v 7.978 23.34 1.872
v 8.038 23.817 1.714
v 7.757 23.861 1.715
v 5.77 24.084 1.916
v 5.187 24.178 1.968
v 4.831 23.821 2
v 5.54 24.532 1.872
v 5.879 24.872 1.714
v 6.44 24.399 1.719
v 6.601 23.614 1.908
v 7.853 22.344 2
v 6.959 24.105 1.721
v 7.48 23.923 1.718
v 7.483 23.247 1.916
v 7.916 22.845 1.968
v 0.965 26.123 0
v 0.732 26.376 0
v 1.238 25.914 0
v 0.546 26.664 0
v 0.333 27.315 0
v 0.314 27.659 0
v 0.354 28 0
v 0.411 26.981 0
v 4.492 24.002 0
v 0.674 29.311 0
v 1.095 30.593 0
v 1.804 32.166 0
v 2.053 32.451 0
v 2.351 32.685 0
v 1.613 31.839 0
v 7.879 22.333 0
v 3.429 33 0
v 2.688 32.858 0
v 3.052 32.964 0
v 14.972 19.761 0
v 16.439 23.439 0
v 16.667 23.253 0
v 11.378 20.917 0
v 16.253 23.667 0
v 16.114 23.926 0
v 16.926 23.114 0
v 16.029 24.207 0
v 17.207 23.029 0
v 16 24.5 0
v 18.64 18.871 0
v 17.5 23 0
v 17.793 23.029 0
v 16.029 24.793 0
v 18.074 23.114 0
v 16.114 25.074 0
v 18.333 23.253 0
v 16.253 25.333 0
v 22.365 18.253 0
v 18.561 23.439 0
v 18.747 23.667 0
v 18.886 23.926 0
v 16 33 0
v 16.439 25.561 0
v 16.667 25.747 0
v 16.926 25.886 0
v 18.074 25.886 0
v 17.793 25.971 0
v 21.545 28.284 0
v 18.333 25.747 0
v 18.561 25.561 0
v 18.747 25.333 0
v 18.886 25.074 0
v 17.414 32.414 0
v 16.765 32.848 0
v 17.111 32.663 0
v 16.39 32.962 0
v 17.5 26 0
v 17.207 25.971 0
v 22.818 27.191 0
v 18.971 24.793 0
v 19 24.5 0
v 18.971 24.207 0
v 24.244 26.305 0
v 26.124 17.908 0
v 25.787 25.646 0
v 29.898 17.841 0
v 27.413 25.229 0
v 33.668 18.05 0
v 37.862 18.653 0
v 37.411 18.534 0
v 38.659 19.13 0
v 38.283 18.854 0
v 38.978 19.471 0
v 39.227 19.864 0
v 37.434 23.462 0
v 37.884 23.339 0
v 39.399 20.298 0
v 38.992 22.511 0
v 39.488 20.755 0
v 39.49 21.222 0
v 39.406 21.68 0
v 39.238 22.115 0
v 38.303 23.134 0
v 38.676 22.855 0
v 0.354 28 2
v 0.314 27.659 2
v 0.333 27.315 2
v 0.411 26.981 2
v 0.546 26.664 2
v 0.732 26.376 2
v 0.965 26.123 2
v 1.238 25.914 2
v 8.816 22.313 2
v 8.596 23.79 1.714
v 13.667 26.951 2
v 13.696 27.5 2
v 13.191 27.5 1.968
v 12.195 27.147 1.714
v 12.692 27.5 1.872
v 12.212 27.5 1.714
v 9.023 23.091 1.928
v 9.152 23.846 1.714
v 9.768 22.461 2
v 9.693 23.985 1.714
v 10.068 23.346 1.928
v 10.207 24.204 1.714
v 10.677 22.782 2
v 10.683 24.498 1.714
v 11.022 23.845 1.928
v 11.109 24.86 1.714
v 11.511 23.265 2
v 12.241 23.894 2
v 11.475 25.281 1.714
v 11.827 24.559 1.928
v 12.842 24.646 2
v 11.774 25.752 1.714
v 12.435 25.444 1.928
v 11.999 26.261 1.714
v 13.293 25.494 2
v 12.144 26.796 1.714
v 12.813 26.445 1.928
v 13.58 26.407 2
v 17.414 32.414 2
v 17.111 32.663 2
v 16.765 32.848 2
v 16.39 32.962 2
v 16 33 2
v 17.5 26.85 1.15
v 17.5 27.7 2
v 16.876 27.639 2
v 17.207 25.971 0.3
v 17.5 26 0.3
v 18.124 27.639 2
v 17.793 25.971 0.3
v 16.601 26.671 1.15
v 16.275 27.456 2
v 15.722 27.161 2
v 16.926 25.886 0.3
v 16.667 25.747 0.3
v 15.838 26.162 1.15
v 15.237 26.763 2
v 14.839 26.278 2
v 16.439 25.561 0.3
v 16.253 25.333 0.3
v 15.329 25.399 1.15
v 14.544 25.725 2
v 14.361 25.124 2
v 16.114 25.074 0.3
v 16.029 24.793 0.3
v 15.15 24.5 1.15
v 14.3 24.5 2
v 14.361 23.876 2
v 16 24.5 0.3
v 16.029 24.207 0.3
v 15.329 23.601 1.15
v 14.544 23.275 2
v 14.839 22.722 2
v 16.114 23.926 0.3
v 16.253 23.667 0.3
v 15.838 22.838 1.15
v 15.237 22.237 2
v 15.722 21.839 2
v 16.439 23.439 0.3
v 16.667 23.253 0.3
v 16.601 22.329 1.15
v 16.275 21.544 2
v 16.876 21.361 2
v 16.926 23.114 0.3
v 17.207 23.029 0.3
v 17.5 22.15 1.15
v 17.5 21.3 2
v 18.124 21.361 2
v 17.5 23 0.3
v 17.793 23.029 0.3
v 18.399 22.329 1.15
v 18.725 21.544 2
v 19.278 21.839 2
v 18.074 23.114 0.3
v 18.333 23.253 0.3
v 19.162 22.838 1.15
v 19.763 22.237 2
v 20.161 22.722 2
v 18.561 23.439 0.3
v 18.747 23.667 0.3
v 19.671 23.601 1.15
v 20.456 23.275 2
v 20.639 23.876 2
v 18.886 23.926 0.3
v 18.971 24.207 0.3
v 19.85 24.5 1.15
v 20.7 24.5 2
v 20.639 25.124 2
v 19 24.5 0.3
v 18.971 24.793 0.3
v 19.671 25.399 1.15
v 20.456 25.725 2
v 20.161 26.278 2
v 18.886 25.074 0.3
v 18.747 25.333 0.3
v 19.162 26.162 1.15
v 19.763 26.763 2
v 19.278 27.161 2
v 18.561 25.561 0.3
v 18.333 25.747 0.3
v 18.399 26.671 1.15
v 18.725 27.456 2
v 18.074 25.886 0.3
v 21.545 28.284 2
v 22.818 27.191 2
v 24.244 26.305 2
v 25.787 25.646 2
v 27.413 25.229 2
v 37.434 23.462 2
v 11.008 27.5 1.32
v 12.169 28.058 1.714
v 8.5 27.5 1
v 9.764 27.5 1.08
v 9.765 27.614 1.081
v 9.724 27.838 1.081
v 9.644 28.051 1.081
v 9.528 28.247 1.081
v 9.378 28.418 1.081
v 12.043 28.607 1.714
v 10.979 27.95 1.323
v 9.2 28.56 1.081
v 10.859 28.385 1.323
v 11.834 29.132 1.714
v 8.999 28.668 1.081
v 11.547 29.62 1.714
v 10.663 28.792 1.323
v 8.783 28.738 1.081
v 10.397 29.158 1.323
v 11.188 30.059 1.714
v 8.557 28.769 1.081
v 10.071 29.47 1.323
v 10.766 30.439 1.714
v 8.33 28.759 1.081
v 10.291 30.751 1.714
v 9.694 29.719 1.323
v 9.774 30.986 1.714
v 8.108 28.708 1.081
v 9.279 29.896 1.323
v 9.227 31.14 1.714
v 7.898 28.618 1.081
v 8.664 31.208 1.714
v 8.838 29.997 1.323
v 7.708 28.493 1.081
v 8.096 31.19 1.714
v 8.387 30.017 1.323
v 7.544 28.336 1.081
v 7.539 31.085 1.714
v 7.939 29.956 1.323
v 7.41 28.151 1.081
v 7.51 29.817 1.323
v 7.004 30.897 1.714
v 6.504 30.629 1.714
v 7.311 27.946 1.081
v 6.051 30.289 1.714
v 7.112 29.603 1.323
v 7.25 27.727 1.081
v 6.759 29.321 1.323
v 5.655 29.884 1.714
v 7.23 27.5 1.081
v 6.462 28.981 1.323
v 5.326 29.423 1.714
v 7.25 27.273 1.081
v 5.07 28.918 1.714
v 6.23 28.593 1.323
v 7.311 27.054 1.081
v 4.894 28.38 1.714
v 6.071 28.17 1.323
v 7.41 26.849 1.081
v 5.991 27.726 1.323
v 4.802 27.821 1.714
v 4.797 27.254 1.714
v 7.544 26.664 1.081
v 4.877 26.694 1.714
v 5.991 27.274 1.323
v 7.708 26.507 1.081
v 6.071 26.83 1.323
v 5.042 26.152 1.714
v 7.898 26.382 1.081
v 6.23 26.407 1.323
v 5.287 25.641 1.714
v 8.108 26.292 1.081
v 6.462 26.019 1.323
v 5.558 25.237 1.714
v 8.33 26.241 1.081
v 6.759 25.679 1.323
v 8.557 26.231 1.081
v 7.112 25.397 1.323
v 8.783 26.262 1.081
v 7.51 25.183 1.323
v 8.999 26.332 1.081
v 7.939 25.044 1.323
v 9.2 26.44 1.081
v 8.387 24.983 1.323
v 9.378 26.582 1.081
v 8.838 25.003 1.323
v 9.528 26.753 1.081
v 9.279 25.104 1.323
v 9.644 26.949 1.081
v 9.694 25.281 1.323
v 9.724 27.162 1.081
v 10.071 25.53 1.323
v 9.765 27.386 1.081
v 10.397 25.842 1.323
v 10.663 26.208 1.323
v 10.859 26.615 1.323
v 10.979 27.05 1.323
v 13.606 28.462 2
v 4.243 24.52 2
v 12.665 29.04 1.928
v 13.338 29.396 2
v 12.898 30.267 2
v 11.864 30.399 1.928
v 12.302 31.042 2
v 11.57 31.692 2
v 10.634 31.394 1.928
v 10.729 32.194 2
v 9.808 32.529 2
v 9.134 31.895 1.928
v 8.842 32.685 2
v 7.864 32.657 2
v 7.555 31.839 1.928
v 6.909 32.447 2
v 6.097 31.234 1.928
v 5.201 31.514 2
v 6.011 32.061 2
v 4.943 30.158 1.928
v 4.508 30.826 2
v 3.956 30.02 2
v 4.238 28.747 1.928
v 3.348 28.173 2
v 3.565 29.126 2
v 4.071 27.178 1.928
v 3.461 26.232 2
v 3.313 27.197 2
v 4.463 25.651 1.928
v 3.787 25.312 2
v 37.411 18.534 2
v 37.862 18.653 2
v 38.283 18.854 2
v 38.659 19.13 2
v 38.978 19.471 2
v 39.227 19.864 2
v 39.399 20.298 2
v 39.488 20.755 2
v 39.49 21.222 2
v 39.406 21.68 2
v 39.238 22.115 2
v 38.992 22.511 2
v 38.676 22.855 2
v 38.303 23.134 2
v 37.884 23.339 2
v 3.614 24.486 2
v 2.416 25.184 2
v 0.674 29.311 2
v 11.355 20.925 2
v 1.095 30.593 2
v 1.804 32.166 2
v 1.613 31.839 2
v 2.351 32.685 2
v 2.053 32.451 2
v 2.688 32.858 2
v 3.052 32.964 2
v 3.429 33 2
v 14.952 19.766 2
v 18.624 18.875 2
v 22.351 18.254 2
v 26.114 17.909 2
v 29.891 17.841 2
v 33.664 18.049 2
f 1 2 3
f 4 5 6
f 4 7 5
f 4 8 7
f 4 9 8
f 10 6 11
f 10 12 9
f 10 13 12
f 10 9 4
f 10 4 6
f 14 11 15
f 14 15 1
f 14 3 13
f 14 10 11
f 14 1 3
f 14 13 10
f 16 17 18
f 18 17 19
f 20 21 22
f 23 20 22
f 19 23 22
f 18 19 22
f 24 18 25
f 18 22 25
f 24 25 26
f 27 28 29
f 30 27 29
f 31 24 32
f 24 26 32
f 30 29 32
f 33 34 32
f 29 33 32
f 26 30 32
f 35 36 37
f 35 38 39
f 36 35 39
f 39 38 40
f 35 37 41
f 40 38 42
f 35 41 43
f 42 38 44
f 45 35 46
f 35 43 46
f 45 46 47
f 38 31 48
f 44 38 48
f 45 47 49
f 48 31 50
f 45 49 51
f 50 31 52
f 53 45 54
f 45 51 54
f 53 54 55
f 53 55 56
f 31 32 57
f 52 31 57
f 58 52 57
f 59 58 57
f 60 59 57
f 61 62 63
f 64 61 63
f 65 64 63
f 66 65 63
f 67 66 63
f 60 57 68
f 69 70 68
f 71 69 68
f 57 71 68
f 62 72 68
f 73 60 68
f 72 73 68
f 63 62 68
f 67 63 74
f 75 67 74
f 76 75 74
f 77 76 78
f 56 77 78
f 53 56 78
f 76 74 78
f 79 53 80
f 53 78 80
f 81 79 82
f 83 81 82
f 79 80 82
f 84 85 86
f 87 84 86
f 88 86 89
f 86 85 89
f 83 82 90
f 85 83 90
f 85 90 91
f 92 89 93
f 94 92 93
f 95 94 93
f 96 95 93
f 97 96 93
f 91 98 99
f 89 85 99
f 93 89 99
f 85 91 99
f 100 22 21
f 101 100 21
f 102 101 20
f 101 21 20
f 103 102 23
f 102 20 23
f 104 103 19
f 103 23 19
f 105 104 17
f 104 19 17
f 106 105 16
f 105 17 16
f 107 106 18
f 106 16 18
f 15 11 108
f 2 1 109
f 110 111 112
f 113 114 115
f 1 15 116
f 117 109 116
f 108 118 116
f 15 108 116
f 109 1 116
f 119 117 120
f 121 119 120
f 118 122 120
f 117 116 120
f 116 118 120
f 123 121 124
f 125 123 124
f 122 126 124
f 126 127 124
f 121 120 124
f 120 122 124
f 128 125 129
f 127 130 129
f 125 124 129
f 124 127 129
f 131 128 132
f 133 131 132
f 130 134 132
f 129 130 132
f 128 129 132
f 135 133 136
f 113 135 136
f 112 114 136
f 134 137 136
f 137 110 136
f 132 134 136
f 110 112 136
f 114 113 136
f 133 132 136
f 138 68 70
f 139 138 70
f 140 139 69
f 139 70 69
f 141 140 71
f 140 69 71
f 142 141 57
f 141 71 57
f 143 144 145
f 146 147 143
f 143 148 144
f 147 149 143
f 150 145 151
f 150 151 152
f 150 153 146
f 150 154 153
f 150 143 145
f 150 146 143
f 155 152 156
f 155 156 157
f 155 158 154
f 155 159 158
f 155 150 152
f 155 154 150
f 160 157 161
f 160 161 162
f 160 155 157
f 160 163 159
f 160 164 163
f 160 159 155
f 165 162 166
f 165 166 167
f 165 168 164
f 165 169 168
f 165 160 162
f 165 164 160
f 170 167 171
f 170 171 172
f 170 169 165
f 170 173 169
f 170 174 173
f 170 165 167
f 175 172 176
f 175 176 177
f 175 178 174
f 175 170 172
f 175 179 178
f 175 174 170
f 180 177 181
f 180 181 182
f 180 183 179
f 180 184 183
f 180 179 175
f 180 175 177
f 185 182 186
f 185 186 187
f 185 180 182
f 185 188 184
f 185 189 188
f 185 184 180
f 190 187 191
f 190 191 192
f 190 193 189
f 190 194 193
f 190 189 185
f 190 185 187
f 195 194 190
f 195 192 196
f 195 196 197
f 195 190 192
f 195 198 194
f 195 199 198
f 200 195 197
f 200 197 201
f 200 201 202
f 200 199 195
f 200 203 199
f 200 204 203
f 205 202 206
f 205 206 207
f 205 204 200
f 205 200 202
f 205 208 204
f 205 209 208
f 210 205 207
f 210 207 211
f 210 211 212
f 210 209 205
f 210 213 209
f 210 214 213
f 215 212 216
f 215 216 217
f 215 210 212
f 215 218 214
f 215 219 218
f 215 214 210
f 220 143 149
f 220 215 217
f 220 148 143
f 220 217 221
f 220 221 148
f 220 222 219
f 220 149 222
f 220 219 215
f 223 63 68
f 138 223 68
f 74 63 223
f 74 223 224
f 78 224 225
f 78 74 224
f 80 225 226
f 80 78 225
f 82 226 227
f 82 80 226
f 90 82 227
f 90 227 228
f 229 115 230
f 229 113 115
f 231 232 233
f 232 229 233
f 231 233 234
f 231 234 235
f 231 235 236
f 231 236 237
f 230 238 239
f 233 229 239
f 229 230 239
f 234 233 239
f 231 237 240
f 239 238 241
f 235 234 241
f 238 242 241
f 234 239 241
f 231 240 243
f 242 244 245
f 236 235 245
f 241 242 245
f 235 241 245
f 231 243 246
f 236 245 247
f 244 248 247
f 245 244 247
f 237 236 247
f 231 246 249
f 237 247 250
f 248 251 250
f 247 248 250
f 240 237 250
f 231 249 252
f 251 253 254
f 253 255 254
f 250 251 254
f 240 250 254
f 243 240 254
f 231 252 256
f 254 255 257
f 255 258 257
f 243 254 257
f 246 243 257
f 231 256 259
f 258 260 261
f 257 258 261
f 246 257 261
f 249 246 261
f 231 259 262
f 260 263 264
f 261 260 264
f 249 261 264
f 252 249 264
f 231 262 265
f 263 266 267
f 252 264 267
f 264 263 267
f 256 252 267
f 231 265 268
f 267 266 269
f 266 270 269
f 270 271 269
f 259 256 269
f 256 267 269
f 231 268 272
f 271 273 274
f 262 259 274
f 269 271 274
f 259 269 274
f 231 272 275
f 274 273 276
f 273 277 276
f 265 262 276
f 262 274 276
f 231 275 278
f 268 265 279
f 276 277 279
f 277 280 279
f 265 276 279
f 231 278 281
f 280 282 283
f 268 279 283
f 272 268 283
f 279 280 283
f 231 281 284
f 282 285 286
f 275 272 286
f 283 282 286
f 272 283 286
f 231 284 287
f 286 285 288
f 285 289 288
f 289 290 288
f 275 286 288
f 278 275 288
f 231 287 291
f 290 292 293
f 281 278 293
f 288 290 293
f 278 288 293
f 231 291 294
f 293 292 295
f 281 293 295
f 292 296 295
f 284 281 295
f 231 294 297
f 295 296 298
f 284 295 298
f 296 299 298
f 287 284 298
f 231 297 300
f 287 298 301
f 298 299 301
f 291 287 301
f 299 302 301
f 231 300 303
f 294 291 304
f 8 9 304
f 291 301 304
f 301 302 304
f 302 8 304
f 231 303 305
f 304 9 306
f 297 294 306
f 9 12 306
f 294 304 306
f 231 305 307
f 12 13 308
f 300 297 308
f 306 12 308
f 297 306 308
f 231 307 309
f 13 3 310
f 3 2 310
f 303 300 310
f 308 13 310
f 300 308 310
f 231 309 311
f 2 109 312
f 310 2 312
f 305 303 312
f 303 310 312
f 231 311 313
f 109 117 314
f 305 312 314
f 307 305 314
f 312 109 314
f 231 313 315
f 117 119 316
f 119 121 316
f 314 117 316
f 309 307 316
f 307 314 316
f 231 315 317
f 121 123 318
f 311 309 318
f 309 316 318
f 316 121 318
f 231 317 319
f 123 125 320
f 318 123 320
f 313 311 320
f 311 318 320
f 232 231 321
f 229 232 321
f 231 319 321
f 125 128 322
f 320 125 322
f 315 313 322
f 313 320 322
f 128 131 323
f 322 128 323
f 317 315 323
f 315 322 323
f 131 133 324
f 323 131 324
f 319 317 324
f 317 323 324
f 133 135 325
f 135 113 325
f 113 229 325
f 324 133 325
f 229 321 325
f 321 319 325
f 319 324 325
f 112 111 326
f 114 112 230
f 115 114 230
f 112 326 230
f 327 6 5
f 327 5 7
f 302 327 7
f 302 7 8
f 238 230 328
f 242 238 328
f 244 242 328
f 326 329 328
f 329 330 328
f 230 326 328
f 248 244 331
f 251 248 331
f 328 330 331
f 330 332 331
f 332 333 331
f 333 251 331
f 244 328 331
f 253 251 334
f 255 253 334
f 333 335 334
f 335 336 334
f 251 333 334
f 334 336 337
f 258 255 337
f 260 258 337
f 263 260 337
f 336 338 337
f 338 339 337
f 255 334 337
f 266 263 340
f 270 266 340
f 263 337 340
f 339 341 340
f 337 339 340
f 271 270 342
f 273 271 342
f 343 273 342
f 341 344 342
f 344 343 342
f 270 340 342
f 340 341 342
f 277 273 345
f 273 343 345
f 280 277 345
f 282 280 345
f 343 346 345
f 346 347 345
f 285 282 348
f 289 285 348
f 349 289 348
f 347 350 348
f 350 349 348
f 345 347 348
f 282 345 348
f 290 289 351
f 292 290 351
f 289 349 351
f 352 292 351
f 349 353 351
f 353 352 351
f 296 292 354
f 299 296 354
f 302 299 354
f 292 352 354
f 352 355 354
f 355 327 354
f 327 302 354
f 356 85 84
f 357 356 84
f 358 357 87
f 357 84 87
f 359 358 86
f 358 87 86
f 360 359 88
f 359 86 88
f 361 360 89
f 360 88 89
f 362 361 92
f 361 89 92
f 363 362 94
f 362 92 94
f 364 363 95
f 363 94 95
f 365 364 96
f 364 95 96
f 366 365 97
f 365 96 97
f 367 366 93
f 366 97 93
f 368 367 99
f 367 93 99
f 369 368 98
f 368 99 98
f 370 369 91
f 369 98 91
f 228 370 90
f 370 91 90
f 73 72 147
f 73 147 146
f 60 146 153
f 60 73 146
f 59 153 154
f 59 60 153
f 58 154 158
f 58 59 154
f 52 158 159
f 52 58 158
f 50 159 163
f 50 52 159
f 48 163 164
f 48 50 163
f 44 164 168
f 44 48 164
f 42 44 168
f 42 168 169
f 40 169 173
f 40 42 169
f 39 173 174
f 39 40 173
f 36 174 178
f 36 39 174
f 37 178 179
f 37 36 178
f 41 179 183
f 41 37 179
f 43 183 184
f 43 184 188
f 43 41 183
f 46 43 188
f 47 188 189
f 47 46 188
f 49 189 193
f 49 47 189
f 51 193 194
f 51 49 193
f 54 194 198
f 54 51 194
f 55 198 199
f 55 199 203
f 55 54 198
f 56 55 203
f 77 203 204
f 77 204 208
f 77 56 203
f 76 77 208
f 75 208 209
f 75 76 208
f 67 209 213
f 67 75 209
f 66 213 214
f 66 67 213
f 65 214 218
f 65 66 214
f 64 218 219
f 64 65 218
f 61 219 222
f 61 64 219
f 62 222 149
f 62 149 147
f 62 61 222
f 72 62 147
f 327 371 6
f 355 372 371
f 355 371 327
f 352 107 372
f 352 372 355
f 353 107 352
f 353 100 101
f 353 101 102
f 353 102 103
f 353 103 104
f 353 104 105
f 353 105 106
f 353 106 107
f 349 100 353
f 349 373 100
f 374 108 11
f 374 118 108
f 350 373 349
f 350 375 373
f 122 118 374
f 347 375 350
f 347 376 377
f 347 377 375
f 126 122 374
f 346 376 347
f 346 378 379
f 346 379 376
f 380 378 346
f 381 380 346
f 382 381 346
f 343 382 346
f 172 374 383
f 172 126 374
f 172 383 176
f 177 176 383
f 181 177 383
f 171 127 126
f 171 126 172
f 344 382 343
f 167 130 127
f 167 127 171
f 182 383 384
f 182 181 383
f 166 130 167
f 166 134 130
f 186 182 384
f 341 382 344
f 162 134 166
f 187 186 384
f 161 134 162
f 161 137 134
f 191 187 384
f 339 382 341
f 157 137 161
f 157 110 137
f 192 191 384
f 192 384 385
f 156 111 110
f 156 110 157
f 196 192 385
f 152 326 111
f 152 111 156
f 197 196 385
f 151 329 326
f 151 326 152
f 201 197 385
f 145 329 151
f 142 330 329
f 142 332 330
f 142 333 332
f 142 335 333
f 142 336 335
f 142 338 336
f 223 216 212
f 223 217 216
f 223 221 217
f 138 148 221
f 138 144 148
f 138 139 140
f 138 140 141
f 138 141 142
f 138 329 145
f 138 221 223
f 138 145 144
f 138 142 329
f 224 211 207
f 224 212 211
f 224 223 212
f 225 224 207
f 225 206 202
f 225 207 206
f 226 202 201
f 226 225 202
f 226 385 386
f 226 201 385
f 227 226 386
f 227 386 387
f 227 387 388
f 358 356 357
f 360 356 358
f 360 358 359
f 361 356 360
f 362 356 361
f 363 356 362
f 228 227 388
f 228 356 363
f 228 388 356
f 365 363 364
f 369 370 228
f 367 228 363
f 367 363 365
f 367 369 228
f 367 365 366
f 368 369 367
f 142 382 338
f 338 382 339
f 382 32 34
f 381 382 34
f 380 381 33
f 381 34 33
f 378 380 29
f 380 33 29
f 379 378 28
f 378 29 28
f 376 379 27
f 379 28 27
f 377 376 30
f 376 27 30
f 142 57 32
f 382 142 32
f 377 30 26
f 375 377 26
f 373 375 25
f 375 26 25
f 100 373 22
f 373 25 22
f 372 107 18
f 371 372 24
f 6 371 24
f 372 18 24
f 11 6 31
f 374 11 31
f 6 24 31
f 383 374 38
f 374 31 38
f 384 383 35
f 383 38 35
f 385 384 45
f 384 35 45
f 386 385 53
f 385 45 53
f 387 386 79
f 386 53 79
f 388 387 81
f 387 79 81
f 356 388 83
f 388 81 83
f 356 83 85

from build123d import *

# Parameters (mm, degrees)
PAD003_DEPTH = 2
FILLET_R     = 4


with BuildPart() as sphere:
    # Sphere → Sphere (revolve)
    with BuildSketch(Plane(origin=(8.5, 27.5, 11), x_dir=(1, 0, 0), z_dir=(0, -1, 0))):
        with BuildLine():
            ThreePointArc((0, -10), (10, 0), (0, 10))
            Line((0, 10), (0, -10))
        make_face()
    revolve(axis=Axis((8.5, 27.5, 11), (0, 0, 1)))


with BuildPart() as clone_of_countersunk002:
    # Sketch007 → Revolution001 (revolve)
    with BuildSketch(Plane.YZ):
        Polygon((3.2, 0), (1.5, -1.7), (1.5, -10), (0, -10), (0, 0), align=None)
    revolve(axis=Axis((0, 0, 0), (0, 0, 1)))


with BuildPart() as clone_of_countersunk002_1:
    # Clone005 placement: moved
    add(clone_of_countersunk002.part.moved(Location((17.5, 24.5, 2))))


with BuildPart() as samplefix:
    # Sketch → Pad003 (new body)
    with BuildSketch(Plane.XY):
        with BuildLine():
            ThreePointArc((1.237539, 25.913851), (18.640493, 18.871057), (37.411488, 18.534097))
            ThreePointArc((37.411488, 18.534097), (39.499974, 20.988518), (37.43412, 23.462019))
            Line((27.412694, 25.229067), (37.43412, 23.462019))
            ThreePointArc((21.544649, 28.283778), (24.243589, 26.304833), (27.412694, 25.229067))
            Line((21.544649, 28.283778), (17.414214, 32.414214))
            ThreePointArc((17.414214, 32.414214), (16.765367, 32.847759), (16, 33))
            Line((16, 33), (3.428753, 33))
            ThreePointArc((3.428753, 33), (2.351121, 32.684847), (1.613108, 31.83871))
            ThreePointArc((1.613108, 31.83871), (0.872192, 29.955824), (0.353572, 28))
            ThreePointArc((0.353572, 28), (0.471658, 26.81968), (1.237539, 25.913851))
        make_face()
    extrude(amount=PAD003_DEPTH)

    # Cut003: cut Clone of Countersunk002
    add(clone_of_countersunk002_1.part, mode=Mode.SUBTRACT)

    # Cut004: cut Sphere
    add(sphere.part, mode=Mode.SUBTRACT)

    # Fillet
    fillet_edges = [samplefix.edges().sort_by_distance(p)[0] for p in [
        (4.141101, 27.5, 2),
    ]]
    fillet(fillet_edges, radius=FILLET_R)


solid = samplefix.part
